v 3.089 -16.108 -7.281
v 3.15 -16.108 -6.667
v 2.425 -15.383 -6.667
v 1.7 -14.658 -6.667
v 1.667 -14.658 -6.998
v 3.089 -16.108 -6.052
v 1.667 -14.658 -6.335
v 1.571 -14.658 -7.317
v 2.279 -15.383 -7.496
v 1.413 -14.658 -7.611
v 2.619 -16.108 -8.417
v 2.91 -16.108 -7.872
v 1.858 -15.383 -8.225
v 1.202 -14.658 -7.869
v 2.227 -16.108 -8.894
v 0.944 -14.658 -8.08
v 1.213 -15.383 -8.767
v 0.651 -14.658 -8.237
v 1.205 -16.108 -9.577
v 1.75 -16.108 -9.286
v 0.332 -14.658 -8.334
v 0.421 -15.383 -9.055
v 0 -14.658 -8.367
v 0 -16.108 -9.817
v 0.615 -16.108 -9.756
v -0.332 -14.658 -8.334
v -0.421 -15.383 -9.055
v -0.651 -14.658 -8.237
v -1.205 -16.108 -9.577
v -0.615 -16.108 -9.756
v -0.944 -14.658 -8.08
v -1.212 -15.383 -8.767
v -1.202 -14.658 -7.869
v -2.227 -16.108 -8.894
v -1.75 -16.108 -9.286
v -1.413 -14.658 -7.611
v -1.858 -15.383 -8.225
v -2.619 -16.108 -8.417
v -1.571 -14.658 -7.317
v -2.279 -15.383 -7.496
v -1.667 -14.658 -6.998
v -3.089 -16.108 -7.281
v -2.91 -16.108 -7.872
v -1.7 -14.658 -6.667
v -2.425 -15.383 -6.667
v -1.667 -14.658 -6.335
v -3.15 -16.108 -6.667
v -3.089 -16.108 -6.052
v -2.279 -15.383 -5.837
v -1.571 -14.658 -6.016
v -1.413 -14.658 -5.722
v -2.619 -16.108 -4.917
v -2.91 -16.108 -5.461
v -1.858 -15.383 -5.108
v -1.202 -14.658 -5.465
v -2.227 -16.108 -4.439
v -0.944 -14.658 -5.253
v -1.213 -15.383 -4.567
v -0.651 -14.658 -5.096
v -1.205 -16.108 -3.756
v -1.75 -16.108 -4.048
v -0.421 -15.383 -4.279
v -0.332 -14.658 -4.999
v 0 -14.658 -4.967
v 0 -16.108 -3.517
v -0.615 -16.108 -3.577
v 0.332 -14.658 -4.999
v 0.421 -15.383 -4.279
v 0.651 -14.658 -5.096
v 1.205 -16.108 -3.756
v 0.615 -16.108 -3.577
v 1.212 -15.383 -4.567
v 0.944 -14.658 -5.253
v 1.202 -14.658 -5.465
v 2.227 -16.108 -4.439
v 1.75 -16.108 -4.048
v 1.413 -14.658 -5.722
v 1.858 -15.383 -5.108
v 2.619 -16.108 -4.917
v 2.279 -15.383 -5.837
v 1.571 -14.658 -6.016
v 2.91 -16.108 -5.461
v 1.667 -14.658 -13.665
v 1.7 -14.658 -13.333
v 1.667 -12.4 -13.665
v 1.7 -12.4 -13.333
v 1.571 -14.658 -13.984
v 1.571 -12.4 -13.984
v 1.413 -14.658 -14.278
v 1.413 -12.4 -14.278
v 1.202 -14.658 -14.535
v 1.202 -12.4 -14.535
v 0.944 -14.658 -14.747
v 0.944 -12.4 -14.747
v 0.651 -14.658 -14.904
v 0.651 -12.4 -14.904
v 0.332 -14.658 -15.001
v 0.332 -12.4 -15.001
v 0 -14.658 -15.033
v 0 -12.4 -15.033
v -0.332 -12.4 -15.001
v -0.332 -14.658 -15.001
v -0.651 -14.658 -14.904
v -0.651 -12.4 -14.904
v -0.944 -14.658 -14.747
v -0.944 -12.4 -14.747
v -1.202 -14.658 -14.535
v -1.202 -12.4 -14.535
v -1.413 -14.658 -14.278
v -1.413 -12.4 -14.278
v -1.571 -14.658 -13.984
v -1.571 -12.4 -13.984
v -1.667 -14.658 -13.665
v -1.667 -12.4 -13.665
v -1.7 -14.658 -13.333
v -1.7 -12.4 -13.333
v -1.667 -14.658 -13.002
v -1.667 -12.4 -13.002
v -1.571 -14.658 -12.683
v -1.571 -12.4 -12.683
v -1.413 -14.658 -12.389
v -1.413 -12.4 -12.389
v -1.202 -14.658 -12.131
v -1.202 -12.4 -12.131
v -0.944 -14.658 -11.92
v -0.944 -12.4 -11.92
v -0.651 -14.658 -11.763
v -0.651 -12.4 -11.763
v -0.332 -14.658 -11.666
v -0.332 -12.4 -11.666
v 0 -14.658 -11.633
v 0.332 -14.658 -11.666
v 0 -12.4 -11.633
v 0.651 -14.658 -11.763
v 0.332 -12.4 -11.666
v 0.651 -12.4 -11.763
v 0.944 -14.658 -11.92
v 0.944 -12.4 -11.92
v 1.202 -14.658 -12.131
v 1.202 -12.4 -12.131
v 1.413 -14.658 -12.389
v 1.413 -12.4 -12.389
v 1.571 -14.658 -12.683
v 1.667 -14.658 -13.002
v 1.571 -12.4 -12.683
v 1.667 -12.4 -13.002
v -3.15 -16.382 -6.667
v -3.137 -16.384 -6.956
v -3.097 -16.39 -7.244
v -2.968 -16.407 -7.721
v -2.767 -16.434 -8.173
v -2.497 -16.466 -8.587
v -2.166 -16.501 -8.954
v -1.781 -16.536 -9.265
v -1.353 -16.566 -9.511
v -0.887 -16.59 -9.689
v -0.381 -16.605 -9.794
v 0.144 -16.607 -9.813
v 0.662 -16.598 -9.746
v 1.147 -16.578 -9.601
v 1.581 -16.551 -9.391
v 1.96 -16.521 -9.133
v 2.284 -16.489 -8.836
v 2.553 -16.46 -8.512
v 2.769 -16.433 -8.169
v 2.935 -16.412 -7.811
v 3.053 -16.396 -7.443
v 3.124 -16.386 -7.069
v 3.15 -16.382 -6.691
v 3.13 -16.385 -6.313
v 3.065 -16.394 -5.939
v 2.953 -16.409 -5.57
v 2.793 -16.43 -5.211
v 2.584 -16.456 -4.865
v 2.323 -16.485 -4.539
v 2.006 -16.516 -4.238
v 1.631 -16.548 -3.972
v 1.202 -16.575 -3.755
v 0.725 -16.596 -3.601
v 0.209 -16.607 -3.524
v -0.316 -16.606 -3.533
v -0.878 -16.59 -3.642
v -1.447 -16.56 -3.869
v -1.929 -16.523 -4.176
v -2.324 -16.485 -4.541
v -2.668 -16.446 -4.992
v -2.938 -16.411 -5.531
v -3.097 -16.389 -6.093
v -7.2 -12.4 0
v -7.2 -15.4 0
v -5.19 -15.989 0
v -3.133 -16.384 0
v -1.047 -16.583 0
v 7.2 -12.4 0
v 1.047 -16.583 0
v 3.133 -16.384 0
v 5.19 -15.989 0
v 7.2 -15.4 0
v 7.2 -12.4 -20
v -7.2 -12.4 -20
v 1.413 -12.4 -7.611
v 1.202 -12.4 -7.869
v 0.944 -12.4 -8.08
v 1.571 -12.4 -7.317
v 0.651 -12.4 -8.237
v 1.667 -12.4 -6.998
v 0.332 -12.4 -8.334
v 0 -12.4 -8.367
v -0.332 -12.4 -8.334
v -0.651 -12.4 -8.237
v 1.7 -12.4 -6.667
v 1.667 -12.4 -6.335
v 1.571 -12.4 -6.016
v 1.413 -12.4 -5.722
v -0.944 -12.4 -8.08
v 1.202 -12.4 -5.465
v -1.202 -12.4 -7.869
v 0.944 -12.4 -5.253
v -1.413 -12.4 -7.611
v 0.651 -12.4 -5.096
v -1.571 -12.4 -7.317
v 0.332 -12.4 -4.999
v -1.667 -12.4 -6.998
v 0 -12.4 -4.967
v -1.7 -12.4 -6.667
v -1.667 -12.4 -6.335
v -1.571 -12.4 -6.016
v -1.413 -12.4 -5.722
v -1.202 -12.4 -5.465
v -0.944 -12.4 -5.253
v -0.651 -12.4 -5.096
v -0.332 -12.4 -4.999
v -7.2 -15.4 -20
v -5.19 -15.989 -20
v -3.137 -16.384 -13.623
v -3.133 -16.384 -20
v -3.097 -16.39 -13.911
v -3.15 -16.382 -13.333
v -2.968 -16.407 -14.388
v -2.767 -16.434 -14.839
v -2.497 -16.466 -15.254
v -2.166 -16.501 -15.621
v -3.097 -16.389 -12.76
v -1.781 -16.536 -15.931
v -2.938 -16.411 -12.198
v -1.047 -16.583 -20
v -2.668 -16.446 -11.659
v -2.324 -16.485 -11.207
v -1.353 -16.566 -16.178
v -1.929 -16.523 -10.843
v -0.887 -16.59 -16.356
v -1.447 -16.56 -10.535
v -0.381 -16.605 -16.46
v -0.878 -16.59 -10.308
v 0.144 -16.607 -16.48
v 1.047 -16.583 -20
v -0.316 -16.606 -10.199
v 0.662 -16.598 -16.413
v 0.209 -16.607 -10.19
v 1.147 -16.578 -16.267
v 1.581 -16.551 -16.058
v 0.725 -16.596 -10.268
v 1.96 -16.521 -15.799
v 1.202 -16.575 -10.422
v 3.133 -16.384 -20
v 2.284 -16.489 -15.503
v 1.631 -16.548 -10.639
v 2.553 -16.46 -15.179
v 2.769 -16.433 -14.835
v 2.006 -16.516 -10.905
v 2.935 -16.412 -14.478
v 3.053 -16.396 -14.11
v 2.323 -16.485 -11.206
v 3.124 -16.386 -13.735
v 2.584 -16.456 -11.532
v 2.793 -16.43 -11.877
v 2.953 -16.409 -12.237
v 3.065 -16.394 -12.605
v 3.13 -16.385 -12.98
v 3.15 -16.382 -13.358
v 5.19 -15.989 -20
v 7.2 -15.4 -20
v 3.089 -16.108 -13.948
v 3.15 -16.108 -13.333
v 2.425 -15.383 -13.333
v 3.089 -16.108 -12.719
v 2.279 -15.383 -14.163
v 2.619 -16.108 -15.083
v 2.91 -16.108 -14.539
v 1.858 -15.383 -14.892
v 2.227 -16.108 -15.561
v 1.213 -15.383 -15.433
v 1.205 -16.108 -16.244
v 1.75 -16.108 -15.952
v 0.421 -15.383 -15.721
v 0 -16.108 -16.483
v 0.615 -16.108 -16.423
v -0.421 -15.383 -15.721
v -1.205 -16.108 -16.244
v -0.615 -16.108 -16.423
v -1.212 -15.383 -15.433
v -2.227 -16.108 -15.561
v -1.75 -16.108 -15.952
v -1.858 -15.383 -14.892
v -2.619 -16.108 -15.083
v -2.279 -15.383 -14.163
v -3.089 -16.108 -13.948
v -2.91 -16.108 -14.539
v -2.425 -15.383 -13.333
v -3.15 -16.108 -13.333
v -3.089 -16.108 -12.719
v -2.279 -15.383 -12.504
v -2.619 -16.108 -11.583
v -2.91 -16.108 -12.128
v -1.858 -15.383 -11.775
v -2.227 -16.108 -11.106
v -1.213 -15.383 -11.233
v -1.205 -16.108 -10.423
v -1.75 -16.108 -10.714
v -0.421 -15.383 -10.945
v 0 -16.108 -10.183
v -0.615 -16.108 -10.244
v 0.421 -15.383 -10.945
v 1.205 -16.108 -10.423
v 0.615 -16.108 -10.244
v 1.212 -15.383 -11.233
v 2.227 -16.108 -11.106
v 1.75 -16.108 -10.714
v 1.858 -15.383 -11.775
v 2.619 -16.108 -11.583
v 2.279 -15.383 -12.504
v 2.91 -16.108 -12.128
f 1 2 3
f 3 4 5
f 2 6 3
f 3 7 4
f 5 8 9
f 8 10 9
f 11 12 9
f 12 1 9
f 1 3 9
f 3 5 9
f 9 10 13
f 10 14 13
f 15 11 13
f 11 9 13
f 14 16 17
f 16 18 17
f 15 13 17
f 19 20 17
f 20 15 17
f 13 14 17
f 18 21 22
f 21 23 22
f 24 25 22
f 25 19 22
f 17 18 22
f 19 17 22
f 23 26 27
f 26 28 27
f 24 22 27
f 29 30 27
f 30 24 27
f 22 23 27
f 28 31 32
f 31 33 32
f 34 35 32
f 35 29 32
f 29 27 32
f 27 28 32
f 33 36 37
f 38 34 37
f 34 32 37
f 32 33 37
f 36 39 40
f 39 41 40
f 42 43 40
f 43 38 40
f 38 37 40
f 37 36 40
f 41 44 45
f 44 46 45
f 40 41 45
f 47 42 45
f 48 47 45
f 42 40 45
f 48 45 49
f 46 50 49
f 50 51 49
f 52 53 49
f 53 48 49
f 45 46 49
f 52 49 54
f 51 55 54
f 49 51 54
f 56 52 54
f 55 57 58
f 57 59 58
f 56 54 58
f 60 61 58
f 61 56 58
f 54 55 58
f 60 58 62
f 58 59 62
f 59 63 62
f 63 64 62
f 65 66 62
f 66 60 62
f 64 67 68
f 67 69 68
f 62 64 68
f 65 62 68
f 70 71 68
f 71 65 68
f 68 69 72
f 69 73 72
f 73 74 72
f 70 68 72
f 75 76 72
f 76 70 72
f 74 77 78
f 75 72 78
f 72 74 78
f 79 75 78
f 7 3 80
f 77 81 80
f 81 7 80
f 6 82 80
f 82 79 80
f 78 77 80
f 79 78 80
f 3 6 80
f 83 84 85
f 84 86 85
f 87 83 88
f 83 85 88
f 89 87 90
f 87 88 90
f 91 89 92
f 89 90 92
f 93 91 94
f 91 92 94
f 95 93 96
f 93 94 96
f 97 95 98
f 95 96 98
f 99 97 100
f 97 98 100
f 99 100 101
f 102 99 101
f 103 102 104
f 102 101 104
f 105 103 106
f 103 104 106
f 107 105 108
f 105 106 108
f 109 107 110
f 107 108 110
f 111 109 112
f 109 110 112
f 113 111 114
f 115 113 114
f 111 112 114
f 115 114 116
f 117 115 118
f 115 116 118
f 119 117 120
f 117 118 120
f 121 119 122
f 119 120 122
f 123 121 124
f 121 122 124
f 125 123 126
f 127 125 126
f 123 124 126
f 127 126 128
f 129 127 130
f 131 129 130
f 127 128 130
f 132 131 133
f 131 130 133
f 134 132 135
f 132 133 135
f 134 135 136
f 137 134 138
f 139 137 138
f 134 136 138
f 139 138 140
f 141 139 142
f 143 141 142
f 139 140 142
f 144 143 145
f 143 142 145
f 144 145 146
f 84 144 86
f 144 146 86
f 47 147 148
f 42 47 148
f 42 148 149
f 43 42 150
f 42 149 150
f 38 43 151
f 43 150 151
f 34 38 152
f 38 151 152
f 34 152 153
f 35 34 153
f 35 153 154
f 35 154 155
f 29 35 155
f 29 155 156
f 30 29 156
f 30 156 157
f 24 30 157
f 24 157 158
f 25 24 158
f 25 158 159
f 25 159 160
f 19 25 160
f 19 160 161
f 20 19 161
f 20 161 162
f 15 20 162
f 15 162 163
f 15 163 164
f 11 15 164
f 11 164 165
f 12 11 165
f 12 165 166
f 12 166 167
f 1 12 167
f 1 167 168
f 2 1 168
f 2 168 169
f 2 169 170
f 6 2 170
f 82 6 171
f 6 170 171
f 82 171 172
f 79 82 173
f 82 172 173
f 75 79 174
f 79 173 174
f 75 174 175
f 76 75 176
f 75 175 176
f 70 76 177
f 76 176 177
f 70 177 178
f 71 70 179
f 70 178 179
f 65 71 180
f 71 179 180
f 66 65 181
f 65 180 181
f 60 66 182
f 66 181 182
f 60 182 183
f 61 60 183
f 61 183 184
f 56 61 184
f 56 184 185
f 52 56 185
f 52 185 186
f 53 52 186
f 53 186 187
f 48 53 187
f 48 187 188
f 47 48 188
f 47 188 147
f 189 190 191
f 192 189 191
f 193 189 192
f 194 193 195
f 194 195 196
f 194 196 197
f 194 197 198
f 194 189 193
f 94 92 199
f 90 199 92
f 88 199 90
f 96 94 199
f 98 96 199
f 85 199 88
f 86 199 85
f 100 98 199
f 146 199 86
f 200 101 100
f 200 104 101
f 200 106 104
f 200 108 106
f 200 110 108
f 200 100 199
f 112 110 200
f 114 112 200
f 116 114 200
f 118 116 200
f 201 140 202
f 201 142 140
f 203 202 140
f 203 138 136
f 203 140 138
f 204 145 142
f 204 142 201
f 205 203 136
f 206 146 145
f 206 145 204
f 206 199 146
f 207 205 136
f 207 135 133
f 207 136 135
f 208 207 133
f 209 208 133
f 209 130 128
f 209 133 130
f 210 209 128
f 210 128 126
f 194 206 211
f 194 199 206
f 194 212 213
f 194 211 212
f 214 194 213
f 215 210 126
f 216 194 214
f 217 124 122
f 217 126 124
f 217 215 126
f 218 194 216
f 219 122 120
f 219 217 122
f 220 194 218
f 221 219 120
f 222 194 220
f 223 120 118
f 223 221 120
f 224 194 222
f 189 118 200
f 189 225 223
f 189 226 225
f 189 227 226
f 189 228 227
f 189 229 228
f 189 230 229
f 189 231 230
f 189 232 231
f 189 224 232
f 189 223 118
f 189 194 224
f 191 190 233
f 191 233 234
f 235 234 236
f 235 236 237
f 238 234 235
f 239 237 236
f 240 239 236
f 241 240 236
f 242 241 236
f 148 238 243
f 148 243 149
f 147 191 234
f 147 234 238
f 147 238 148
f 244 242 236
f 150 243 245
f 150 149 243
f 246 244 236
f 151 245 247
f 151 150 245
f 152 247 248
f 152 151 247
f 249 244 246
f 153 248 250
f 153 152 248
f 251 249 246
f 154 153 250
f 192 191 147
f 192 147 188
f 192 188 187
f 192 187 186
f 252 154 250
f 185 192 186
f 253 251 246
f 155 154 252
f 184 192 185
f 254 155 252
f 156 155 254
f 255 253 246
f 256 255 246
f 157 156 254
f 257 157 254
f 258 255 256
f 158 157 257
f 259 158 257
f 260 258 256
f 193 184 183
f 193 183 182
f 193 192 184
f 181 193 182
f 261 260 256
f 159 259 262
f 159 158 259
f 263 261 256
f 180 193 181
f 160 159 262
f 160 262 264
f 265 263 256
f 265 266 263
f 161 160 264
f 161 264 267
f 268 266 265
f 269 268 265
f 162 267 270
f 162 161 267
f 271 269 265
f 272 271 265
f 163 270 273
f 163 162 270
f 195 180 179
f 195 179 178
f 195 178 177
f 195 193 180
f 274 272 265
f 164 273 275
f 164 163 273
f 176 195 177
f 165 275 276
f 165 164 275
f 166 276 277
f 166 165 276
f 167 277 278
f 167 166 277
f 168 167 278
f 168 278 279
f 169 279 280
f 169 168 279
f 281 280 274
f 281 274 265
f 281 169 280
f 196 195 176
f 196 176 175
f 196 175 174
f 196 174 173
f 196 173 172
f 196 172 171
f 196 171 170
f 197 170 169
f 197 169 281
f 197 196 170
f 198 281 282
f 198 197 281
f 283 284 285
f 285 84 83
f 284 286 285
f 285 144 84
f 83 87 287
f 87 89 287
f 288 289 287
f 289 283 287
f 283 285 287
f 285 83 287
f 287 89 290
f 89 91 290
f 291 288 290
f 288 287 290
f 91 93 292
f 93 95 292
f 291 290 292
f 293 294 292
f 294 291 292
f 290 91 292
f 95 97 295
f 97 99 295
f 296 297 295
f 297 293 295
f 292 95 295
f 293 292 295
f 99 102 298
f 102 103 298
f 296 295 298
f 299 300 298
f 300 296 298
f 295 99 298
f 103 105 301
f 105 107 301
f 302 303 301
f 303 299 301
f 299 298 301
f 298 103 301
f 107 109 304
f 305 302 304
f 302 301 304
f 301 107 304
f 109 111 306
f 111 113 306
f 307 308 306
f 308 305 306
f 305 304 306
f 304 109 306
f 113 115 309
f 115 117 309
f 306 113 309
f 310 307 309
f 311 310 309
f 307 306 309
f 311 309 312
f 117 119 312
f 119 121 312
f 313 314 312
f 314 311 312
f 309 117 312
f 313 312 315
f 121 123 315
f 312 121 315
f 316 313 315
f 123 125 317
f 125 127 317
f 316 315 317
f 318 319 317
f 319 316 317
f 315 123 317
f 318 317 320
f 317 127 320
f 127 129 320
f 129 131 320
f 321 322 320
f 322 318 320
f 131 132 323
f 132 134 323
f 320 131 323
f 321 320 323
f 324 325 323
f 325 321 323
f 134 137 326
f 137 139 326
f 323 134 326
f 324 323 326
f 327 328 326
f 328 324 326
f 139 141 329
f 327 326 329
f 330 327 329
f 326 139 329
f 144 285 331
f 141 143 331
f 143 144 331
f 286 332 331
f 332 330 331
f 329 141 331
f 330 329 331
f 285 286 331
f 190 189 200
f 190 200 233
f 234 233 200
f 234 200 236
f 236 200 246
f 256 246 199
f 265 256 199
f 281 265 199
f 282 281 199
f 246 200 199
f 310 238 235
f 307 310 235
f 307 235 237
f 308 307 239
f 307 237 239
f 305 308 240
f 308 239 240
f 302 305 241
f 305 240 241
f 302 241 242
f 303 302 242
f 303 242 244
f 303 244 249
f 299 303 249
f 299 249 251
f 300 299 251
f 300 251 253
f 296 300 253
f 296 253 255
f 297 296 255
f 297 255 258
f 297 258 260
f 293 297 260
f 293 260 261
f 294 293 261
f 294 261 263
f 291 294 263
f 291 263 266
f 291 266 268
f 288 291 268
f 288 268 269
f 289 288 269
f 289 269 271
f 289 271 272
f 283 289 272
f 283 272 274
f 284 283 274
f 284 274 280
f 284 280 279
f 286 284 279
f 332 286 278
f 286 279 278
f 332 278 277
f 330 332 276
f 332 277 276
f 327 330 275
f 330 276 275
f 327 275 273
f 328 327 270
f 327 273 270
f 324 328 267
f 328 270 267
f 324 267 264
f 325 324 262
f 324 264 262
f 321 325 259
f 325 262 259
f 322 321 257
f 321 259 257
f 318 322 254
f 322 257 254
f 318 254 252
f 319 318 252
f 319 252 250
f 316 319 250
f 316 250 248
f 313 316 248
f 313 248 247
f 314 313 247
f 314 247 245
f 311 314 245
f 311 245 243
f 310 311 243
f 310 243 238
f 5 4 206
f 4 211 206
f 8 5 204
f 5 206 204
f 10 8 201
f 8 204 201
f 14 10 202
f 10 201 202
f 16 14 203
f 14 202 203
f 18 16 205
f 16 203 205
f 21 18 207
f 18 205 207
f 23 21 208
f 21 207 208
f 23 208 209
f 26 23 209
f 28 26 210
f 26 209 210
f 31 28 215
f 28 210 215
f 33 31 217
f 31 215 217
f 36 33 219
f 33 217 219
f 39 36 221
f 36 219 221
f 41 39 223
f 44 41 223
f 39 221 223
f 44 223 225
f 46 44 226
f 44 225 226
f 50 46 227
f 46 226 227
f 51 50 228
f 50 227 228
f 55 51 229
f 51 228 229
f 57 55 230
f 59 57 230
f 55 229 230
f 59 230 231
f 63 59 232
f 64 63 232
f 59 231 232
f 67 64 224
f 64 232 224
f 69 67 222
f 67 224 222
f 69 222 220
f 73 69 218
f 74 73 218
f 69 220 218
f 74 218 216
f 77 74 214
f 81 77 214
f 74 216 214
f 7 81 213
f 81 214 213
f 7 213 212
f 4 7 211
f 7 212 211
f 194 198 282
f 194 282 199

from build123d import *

# Parameters (mm, degrees)
ESTRUSIONE_ESTRUSIONE1_DEPTH           = 20
SCHIZZO2_R                             = 3.15
TAGLIO_ESTRUSIONE1_DEPTH               = 0.5
FORO_SVASATO_PER_VITE_M3_1_D           = 3.4
FORO_SVASATO_PER_VITE_M3_1_CSINK_D     = 6.3
FORO_SVASATO_PER_VITE_M3_1_CSINK_ANGLE = 90


with BuildPart() as part:
    # Schizzo1 → Estrusione-Estrusione1 (new body)
    with BuildSketch(Plane.XY):
        with BuildLine():
            Line((7.2, -12.4), (-7.2, -12.4))
            Line((-7.2, -12.4), (-7.2, -15.4))
            ThreePointArc((-7.2, -15.4), (0, -16.607910427), (7.2, -15.4))
            Line((7.2, -15.4), (7.2, -12.4))
        make_face()
    extrude(amount=-ESTRUSIONE_ESTRUSIONE1_DEPTH)

    # Schizzo2 → Taglio-Estrusione1 (cut)
    with BuildSketch(Plane(origin=(0, -16.607910427, 0), x_dir=(-1, 0, 0), z_dir=(0, -1, 0))):
        with Locations((0, 13.333333333)):
            Circle(SCHIZZO2_R)
        with Locations((0, 6.666666667)):
            Circle(SCHIZZO2_R)
    extrude(amount=-TAGLIO_ESTRUSIONE1_DEPTH, mode=Mode.SUBTRACT)

    # Foro svasato per Vite M3-1 (through all)
    with Locations(Plane(origin=(0, -16.107910427, -6.666666667), x_dir=(-1, 0, 0), z_dir=(0, -1, 0))):
        with Locations((0, 0), (0, 6.666666666)):
            CounterSinkHole(FORO_SVASATO_PER_VITE_M3_1_D / 2, FORO_SVASATO_PER_VITE_M3_1_CSINK_D / 2, counter_sink_angle=FORO_SVASATO_PER_VITE_M3_1_CSINK_ANGLE)


solid = part.part
